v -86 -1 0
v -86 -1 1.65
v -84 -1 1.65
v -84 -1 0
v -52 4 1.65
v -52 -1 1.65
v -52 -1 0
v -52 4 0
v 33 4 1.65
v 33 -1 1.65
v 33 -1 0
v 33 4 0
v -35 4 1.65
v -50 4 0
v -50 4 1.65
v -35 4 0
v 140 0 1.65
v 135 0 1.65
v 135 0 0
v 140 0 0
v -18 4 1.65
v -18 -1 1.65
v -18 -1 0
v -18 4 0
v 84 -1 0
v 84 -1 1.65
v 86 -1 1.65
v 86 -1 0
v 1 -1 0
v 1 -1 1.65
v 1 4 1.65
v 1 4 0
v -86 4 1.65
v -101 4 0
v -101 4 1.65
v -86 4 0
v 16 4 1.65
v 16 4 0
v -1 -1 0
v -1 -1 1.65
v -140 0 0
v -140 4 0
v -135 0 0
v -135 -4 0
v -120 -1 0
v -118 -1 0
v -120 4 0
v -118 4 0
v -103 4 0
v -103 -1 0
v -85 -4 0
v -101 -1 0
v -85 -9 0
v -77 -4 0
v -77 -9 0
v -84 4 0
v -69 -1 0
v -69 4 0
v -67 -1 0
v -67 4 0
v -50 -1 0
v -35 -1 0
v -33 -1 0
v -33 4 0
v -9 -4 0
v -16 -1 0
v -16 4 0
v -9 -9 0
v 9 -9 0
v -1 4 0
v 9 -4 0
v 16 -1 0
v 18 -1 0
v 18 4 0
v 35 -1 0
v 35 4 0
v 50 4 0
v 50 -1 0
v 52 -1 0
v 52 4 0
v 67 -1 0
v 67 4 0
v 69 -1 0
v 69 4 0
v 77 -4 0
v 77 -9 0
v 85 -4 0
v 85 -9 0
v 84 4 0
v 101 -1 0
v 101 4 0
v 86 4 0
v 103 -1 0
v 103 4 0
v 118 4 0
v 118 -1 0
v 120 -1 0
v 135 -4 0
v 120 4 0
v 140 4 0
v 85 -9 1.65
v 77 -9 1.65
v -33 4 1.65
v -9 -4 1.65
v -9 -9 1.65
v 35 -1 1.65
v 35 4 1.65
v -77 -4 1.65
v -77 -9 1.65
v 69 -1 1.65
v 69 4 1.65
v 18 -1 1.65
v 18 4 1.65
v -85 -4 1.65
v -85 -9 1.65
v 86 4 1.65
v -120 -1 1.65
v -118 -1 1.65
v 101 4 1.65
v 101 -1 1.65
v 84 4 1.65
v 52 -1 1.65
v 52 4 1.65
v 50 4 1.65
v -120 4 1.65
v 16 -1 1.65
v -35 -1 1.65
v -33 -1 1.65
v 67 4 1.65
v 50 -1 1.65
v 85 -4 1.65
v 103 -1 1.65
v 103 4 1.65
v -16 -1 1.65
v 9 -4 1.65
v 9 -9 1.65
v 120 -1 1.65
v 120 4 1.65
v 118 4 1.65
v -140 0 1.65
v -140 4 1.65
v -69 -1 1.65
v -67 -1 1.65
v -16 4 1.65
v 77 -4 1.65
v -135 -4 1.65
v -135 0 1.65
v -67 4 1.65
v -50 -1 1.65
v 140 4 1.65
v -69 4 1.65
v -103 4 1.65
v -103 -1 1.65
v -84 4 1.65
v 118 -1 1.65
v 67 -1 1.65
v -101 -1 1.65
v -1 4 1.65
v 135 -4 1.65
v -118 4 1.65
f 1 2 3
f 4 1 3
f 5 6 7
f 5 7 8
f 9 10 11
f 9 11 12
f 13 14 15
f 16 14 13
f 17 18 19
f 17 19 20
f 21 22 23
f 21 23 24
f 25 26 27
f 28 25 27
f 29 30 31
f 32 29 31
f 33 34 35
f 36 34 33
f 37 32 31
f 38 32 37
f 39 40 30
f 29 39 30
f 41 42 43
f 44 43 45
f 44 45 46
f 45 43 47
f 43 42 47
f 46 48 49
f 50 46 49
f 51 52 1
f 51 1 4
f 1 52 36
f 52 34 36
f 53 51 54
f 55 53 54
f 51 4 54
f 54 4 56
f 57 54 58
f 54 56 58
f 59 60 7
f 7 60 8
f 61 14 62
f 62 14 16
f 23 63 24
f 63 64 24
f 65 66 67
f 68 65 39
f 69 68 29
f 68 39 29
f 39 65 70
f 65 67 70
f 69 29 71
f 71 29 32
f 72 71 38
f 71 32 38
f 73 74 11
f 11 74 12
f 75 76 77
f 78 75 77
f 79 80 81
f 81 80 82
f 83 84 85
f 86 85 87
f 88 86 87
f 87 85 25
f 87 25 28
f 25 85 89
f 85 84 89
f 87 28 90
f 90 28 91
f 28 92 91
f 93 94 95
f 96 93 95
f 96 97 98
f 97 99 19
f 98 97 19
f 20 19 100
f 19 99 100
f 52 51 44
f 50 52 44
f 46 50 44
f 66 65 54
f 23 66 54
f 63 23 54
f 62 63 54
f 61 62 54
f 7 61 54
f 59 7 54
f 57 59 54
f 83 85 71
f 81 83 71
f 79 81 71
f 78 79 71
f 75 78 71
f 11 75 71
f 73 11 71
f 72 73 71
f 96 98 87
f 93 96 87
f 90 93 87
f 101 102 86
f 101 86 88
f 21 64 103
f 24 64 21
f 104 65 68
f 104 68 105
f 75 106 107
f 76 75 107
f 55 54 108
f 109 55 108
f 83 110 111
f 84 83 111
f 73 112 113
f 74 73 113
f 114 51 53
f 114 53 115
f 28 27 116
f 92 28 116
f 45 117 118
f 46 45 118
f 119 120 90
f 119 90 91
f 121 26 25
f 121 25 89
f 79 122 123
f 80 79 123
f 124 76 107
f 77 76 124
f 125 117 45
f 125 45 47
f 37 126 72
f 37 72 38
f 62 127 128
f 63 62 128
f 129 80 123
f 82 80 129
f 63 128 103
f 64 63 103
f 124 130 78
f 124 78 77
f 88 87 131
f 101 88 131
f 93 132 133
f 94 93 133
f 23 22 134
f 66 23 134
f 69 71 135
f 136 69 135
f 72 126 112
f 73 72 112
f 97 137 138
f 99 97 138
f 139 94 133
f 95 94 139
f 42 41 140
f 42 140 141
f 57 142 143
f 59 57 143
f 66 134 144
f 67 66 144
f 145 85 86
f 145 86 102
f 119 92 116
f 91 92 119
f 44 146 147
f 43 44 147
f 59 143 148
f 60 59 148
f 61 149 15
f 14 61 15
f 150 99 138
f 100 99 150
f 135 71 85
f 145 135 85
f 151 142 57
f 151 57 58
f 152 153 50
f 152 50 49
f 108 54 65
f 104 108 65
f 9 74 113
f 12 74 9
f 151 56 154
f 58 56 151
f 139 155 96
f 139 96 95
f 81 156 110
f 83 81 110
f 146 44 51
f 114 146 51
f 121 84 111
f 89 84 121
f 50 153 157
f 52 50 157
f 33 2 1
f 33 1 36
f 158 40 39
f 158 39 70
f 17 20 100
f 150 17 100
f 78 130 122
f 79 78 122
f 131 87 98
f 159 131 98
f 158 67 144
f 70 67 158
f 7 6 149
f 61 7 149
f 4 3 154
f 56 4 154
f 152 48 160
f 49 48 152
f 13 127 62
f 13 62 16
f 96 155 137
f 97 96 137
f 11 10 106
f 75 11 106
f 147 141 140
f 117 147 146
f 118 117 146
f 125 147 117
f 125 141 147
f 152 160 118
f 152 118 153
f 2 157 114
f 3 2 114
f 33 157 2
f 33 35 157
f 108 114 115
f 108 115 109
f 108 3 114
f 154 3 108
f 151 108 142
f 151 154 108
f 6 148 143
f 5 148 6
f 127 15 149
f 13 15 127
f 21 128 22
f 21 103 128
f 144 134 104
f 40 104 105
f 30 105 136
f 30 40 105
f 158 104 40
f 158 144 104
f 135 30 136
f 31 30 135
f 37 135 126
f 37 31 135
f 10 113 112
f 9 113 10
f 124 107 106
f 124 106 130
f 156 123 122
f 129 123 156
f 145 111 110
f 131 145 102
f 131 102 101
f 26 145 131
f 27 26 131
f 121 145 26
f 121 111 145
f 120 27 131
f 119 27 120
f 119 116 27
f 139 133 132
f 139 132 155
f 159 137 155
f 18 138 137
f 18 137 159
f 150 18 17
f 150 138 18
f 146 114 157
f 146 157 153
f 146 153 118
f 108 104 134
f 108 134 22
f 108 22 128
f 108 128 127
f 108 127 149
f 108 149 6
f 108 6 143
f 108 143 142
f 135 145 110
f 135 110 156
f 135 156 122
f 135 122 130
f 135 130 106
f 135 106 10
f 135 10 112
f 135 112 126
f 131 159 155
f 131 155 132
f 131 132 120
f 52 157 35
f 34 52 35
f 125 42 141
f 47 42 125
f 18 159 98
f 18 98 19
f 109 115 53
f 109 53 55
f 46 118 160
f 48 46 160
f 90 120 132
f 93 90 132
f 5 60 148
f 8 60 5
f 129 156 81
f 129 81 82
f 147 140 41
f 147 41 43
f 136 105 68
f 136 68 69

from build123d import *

# Parameters (mm, degrees)
SKETCH_W               = 280
SKETCH_H               = 8
PAD_DEPTH              = 1.65
SKETCH001_W            = 2
SKETCH001_H            = 5
POCKET_DEPTH           = 5
LINEARPATTERN_COUNT    = 15
LINEARPATTERN_PITCH    = 17
SKETCH002_W            = 5
SKETCH002_H            = 4
POCKET001_DEPTH        = 5
LINEARPATTERN001_COUNT = 2
LINEARPATTERN001_PITCH = 275
SKETCH003_W            = 8
SKETCH003_H            = 1.65
SKETCH003_W_2          = 18
PAD001_DEPTH           = 5


with BuildPart() as part:
    # Sketch → Pad (new body)
    with BuildSketch(Plane.XY):
        Rectangle(SKETCH_W, SKETCH_H)
    extrude(amount=PAD_DEPTH)

    # Sketch001 (on Face6 of Pad) → Pocket (cut)
    with BuildSketch(Plane.XY.offset(1.65)):
        with Locations((-119, 1.5)):
            Rectangle(SKETCH001_W, SKETCH001_H)
    pocket = extrude(amount=-POCKET_DEPTH, mode=Mode.SUBTRACT)

    # LinearPattern: Pocket ×15
    with Locations(*[(i * LINEARPATTERN_PITCH, 0, 0) for i in range(1, LINEARPATTERN_COUNT)]):
        add(pocket, mode=Mode.SUBTRACT)

    # Sketch002 (on Face4 of LinearPattern) → Pocket001 (cut)
    with BuildSketch(Plane.XY.offset(1.65)):
        with Locations((-137.5, -2)):
            Rectangle(SKETCH002_W, SKETCH002_H)
    pocket001 = extrude(amount=-POCKET001_DEPTH, mode=Mode.SUBTRACT)

    # LinearPattern001: Pocket001 ×2
    with Locations(*[(i * LINEARPATTERN001_PITCH, 0, 0) for i in range(1, LINEARPATTERN001_COUNT)]):
        add(pocket001, mode=Mode.SUBTRACT)

    # Sketch003 (on Face68 of LinearPattern001) → Pad001 (join)
    with BuildSketch(Plane.XZ.offset(4)):
        with Locations((-81, 0.825)):
            Rectangle(SKETCH003_W, SKETCH003_H)
        with Locations((0, 0.825)):
            Rectangle(SKETCH003_W_2, SKETCH003_H)
        with Locations((81, 0.825)):
            Rectangle(SKETCH003_W, SKETCH003_H)
    extrude(amount=PAD001_DEPTH)


solid = part.part
